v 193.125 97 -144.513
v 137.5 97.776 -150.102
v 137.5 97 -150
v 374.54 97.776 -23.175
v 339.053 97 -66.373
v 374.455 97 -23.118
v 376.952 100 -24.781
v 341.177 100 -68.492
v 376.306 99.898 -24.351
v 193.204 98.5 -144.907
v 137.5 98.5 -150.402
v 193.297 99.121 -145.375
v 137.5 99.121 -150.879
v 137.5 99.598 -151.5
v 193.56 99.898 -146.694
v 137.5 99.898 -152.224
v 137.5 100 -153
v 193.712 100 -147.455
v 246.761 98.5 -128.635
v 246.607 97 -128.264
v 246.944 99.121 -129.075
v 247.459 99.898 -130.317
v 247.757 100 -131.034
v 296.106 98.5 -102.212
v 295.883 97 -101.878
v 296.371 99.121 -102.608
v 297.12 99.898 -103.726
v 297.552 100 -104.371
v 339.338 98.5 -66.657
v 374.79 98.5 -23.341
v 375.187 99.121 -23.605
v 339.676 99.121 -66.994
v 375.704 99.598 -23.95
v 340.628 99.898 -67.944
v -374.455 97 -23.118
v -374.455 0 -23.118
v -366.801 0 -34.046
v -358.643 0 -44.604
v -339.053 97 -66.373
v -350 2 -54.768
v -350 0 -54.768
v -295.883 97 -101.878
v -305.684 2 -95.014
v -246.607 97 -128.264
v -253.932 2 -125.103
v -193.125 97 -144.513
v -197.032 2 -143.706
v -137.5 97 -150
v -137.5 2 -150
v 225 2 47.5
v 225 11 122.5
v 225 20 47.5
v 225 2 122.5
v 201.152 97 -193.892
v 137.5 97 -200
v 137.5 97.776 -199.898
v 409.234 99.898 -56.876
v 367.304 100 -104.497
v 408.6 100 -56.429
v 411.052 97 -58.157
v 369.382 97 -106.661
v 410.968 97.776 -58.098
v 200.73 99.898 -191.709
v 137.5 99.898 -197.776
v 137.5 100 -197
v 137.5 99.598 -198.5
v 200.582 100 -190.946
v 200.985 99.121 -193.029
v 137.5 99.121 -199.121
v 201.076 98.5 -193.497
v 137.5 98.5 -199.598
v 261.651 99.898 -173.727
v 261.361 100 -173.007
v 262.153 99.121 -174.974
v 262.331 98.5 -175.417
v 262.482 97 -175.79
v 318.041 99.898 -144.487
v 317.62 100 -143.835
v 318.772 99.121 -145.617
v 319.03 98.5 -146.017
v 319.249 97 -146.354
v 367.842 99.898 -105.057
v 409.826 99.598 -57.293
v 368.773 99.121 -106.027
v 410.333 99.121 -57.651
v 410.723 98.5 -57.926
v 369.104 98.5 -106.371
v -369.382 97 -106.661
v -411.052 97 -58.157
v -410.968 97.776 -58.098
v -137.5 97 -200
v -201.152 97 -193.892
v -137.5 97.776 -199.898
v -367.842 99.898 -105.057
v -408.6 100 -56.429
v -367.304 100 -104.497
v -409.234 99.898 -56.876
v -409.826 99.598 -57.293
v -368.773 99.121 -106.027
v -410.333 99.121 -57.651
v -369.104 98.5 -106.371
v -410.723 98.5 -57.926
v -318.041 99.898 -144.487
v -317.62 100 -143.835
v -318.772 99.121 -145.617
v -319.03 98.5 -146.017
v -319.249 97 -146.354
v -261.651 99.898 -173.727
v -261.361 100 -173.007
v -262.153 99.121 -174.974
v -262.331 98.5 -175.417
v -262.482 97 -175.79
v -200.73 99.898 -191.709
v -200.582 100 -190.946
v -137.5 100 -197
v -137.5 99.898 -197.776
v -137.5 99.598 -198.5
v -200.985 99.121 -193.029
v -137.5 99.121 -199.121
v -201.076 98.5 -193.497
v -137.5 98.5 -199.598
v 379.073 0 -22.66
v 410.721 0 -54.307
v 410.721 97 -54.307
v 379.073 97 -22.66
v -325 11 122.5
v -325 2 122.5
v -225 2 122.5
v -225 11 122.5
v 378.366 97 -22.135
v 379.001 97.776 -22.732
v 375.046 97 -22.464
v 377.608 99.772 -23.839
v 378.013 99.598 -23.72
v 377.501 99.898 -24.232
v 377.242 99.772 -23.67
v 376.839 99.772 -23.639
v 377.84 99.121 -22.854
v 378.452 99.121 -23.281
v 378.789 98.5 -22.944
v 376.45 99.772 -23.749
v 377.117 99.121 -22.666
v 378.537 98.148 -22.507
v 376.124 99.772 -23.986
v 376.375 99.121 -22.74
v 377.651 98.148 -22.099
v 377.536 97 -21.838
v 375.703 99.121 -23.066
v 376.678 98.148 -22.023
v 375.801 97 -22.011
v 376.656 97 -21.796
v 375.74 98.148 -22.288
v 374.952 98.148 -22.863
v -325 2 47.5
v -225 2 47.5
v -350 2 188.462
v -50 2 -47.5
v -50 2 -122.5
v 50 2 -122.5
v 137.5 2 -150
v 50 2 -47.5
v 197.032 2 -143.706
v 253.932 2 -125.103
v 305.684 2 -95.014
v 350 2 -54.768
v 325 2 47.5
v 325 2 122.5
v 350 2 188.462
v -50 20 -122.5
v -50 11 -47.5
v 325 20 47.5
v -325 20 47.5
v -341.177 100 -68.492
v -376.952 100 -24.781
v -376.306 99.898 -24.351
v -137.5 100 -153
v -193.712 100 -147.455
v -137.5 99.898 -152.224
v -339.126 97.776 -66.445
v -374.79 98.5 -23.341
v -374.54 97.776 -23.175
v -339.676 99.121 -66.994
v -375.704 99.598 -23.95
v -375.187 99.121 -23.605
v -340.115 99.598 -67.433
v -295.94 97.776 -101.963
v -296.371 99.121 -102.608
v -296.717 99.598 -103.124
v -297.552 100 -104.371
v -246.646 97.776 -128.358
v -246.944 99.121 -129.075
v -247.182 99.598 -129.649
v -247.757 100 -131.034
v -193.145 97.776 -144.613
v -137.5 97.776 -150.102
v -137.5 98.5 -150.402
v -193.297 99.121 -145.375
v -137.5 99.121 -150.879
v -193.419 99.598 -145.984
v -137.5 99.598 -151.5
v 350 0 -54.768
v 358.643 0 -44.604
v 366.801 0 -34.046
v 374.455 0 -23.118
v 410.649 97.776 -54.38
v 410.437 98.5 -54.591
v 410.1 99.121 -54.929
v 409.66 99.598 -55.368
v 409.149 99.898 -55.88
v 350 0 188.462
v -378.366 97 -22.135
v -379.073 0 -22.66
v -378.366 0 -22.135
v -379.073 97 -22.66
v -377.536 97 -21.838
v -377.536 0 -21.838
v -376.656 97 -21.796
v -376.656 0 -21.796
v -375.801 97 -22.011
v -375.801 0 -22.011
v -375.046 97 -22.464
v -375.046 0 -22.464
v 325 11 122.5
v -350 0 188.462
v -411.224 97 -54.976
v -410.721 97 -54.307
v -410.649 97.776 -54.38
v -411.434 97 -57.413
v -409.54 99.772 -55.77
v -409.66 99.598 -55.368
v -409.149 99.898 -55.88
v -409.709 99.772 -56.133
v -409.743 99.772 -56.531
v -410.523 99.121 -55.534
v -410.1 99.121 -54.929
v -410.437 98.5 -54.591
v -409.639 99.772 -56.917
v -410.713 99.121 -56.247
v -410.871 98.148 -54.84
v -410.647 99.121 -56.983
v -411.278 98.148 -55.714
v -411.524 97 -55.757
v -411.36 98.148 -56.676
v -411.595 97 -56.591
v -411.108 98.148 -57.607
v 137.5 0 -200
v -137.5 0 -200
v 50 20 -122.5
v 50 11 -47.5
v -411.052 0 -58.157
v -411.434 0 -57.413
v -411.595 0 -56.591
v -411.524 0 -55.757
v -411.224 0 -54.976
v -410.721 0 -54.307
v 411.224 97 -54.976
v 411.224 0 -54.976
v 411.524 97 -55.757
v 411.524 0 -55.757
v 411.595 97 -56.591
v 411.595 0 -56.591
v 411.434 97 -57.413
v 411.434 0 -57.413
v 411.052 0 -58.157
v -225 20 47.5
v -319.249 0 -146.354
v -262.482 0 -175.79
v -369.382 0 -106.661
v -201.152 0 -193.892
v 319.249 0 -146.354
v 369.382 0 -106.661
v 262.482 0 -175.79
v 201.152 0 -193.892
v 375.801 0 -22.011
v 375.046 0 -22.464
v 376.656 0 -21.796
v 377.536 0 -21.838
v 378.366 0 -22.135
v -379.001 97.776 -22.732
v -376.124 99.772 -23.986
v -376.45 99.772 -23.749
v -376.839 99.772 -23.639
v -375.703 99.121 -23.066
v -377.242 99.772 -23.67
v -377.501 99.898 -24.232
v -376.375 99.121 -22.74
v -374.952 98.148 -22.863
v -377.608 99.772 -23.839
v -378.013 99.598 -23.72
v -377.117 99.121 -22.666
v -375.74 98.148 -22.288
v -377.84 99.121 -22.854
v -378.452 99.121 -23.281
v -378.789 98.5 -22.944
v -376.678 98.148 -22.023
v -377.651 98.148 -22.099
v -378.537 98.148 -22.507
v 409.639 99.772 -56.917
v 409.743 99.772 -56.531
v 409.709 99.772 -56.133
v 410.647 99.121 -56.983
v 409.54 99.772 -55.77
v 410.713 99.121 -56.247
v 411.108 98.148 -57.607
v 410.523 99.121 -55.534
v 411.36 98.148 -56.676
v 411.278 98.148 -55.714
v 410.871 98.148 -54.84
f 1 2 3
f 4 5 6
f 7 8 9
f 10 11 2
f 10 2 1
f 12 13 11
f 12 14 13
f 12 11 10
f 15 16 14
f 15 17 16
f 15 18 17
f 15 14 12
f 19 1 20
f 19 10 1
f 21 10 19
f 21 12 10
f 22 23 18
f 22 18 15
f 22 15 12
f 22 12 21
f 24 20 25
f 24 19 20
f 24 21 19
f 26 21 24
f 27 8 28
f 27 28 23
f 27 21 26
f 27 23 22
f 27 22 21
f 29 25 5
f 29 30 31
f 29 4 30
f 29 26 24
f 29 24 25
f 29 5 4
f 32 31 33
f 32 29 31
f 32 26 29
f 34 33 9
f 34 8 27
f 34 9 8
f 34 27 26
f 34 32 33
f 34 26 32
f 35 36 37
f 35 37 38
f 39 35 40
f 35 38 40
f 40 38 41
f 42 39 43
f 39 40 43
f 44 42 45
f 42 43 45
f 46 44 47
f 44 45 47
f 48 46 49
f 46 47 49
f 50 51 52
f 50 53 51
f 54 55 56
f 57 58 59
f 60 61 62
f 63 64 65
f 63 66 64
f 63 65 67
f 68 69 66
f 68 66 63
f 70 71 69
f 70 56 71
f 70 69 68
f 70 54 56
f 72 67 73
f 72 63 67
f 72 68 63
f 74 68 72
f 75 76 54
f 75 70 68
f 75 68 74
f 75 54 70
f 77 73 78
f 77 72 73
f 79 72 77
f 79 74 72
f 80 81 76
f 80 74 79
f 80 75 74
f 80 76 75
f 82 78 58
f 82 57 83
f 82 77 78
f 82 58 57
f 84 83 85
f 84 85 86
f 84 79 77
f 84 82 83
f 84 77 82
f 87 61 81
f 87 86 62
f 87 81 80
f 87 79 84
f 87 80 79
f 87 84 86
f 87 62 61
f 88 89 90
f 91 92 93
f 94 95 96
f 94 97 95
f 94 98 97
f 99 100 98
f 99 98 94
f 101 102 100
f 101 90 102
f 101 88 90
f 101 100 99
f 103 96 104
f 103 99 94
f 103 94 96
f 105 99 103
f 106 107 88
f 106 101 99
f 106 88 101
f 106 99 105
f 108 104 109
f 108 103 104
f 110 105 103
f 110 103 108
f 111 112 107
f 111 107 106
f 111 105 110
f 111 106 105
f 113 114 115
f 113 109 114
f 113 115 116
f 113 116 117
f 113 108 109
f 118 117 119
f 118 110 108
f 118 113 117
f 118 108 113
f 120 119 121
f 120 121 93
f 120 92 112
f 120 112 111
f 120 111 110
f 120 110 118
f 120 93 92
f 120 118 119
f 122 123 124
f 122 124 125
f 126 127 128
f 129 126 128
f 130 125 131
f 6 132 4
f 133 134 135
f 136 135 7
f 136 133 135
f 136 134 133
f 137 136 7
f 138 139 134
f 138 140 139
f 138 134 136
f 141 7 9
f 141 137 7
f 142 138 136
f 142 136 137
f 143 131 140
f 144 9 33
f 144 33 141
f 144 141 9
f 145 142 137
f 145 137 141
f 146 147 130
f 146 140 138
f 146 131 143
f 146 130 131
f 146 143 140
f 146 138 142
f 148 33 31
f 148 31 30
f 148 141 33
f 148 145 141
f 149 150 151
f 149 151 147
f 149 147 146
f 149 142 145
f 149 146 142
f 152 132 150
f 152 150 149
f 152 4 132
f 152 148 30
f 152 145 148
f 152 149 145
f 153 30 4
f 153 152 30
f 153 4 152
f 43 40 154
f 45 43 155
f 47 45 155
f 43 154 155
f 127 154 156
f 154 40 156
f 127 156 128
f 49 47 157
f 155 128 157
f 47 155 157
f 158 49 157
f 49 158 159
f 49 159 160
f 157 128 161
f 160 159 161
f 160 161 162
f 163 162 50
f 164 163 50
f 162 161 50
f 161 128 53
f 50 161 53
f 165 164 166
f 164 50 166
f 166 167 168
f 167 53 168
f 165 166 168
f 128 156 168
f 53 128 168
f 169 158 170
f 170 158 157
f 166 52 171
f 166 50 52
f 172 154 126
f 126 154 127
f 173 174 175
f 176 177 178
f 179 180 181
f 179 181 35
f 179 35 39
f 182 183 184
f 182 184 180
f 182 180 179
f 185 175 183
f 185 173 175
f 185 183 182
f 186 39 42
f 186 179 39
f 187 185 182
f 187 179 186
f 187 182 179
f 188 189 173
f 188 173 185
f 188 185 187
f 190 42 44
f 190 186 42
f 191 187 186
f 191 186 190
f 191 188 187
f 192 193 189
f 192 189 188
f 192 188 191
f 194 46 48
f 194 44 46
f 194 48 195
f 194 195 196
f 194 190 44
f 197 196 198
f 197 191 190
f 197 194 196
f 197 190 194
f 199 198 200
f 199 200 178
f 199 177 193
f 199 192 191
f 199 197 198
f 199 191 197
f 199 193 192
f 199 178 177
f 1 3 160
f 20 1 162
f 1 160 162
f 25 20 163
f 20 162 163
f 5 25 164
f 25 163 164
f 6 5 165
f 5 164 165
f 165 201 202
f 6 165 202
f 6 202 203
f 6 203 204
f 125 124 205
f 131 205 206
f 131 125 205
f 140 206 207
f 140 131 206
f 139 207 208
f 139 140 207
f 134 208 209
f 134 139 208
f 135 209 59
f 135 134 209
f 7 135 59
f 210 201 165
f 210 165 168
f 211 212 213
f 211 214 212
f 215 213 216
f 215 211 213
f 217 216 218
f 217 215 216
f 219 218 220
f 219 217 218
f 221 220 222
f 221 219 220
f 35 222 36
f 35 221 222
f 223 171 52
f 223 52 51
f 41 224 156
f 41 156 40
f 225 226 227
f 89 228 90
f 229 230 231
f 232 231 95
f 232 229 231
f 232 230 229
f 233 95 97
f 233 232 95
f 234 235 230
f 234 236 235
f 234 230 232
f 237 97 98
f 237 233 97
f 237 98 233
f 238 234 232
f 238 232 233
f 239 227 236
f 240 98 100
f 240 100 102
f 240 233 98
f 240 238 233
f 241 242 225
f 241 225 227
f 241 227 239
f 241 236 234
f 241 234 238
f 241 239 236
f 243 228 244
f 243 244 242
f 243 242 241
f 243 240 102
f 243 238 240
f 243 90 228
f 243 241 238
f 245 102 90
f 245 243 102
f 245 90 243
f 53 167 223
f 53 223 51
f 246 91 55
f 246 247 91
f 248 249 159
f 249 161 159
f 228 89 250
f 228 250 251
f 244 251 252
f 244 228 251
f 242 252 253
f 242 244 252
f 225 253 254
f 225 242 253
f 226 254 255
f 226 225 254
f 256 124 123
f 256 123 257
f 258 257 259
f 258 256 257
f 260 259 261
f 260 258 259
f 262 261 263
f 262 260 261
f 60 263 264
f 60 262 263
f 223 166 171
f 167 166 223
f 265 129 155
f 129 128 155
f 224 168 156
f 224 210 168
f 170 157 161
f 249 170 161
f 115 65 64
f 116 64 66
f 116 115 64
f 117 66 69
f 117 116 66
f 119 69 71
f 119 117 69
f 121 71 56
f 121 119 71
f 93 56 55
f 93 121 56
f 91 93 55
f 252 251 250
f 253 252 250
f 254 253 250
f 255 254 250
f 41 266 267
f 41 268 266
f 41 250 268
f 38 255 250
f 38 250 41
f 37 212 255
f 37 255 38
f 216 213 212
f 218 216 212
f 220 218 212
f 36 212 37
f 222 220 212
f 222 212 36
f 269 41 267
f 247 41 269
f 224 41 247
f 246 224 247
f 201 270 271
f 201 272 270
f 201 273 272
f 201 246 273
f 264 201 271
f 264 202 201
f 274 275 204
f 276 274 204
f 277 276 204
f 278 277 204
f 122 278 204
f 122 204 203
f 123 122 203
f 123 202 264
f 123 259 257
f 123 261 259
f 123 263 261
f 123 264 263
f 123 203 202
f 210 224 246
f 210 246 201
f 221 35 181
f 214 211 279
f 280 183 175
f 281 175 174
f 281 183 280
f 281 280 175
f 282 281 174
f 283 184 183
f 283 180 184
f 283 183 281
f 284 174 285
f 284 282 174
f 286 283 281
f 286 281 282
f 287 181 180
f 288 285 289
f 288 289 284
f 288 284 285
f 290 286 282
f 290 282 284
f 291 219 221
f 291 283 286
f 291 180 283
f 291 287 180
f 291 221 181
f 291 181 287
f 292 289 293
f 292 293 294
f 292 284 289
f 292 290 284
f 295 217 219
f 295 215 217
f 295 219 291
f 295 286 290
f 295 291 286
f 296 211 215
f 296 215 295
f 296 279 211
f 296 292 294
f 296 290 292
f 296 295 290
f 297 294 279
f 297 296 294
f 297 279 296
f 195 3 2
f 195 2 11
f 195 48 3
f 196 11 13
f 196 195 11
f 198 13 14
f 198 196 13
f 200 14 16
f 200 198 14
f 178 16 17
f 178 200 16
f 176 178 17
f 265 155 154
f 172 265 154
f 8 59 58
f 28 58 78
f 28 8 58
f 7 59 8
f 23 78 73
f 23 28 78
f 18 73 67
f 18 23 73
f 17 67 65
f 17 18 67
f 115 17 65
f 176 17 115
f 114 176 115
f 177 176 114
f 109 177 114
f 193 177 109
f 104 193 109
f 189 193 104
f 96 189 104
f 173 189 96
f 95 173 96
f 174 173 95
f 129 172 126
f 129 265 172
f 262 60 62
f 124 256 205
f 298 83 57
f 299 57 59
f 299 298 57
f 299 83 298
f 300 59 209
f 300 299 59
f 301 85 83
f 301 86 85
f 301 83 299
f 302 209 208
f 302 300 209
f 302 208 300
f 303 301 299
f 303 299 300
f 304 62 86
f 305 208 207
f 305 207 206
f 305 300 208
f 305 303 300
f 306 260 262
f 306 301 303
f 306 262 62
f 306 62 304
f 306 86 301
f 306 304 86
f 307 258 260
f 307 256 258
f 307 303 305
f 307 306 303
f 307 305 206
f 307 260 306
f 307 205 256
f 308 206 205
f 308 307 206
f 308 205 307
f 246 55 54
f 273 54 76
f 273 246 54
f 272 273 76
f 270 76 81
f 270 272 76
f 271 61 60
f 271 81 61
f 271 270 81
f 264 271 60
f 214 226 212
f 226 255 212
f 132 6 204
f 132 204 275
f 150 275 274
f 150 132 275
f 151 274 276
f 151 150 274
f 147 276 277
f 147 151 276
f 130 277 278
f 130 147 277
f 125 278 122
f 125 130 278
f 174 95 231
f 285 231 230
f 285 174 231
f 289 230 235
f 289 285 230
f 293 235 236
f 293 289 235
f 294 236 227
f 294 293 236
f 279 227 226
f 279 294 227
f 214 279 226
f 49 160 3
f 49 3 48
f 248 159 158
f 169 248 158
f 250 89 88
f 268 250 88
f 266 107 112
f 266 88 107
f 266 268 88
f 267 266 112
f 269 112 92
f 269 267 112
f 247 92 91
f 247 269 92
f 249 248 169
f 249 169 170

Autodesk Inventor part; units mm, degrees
ref_plane "YZ Plane" through (0, 0, 0) normal (1, 0, 0) x (0, 1, 0)
ref_plane "XZ Plane" through (0, 0, 0) normal (0, 1, 0) x (-1, 0, 0)
ref_plane "XY Plane" through (0, 0, 0) normal (0, 0, 1) x (1, 0, 0)
sketch "Sketch1" plane through (0, 0, 0) normal (0, 1, 0) x (-1, 0, 0)
  line L0 (-50, -122.5) -> (50, -122.5)
  line L1 (50, -122.5) -> (50, -47.5)
  line L2 (50, -47.5) -> (-50, -47.5)
  line L3 (-50, -47.5) -> (-50, -122.5)
  line L4 (-50, -122.5) -> (50, -47.5) construction
  line L5 (50, -122.5) -> (-50, -47.5) construction
  line L6 (-325, 122.5) -> (-225, 122.5)
  line L7 (-225, 122.5) -> (-225, 47.5)
  line L8 (-225, 47.5) -> (-325, 47.5)
  line L9 (-325, 47.5) -> (-325, 122.5)
  line L10 (-325, 122.5) -> (-225, 47.5) construction
  line L11 (-225, 122.5) -> (-325, 47.5) construction
  line L12 (0, 214.4175) -> (0, -235.835)
  line L13 (325, 122.5) -> (225, 122.5)
  line L14 (225, 122.5) -> (225, 47.5)
  line L15 (225, 47.5) -> (325, 47.5)
  line L16 (325, 47.5) -> (325, 122.5)
  line L17 (325, 122.5) -> (225, 47.5) construction
  line L18 (225, 122.5) -> (325, 47.5) construction
  point P0 (0, 0)
  point P1 (0, -85)
  point P2 (-275, 85)
  point P3 (275, 85)
  dimension "d0" = 100
  dimension "d1" = 75
  dimension "d2" = 85
  dimension "d3" = 100
  dimension "d4" = 75
  dimension "d5" = 275
  dimension "d6" = 85
sketch "Sketch2" plane through (0, 0, 0) normal (0, 1, 0) x (-1, 0, 0)
  line L0 (-7.5, -95) -> (7.5, -95) projected
  line L1 (7.5, -95) -> (7.5, -75) projected
  line L2 (7.5, -75) -> (-7.5, -75) projected
  line L3 (-7.5, -75) -> (-7.5, -95) projected
  line L4 (267.5, 95) -> (267.5, 75) projected
  line L5 (267.5, 75) -> (282.5, 75) projected
  line L6 (282.5, 75) -> (282.5, 95) projected
  line L7 (282.5, 95) -> (267.5, 95) projected
  line L8 (-267.5, 95) -> (-282.5, 95) projected
  line L9 (-282.5, 95) -> (-282.5, 75) projected
  line L10 (-282.5, 75) -> (-267.5, 75) projected
  line L11 (-267.5, 75) -> (-267.5, 95) projected
  line L12 (-137.5, -150) -> (137.5, -150)
  line L13 (137.5, -150) -> (137.5, -200)
  line L14 (137.5, -200) -> (-137.5, -200)
  line L15 (-137.5, -200) -> (-137.5, -150)
  line L16 (-137.5, -150) -> (137.5, -200) construction
  line L17 (137.5, -150) -> (-137.5, -200) construction
  arc A0 (-376.4677, -20.0539) -> (-137.5, -150) centre (-137.5, 134.7009) ccw
  line L18 (-137.5, -150) -> (-137.5, 134.7009) construction
  line L19 (-412.5, 61.0149) -> (-137.5, 134.7009) construction
  arc A1 (-412.5, -56.0862) -> (-137.5, -200) centre (-137.5, 134.7009) ccw
  line L20 (0, -269.3547) -> (0, -73.2831)
  arc A2 (137.5, -150) -> (376.4677, -20.0539) centre (137.5, 134.7009) ccw
  arc A3 (137.5, -200) -> (412.5, -56.0862) centre (137.5, 134.7009) ccw
  line L21 (412.5, -56.0862) -> (376.4677, -20.0539)
  line L22 (412.5, -56.0862) -> (463.4573, -56.0862) construction
  line L23 (-412.5, -56.0862) -> (-376.4677, -20.0539)
  point P0 (0, 0)
  point P1 (0, -175)
  point P2 (412.5, 61.0149)
  dimension "d9" = 275
  dimension "d10" = 50
  dimension "d11" = 100
  dimension "d12" = 75
  dimension "d17" = 135
extrude "Extrusion2" add sketch "Sketch2" along normal blind 100 contours L12 L13 L14 L20 | L20 L14 L15 L12 | L15 A1 L23 A0 | A2 L21 A3 L13
fillet "Fillet1" radius 3 12 edges at (0, 100, -150) (273.507, 100, -115.4125) (-273.507, 100, -115.4125) (-394.4839, 100, -38.07) (394.4839, 100, -38.07) (-376.4677, 50, -20.0539) (-412.5, 50, -56.0862) (376.4677, 50, -20.0539) (412.5, 50, -56.0862) (-292.6904, 100, -161.847) (292.6904, 100, -161.847) (0, 100, -200)
sketch "Sketch3" plane through (0, 0, 0) normal (0, -1, 0) x (1, 0, 0)
  line L0 (350, 188.4615) -> (-350, 188.4615)
  line L1 (-350, 188.4615) -> (-350, -54.7677)
  line L2 (350, -54.7677) -> (350, 188.4615)
  arc A0 (411.0516, -58.1571) -> (410.721, -54.3072) centre (408.5997, -56.4285) ccw projected
  line L3 (379.0735, -22.6597) -> (410.721, -54.3072) projected
  arc A1 (379.0735, -22.6597) -> (374.4553, -23.118) centre (376.9522, -24.781) ccw projected
  arc A2 (137.5, -150) -> (374.4553, -23.118) centre (137.5, 134.7009) ccw projected
  line L4 (-137.5, -150) -> (137.5, -150) projected
  arc A3 (-374.4553, -23.118) -> (-137.5, -150) centre (-137.5, 134.7009) ccw projected
  arc A4 (-374.4553, -23.118) -> (-379.0735, -22.6597) centre (-376.9522, -24.781) ccw projected
  line L5 (-410.721, -54.3072) -> (-379.0735, -22.6597) projected
  arc A5 (-410.721, -54.3072) -> (-411.0516, -58.1571) centre (-408.5997, -56.4285) ccw projected
  arc A6 (-411.0516, -58.1571) -> (-137.5, -200) centre (-137.5, 134.7009) ccw projected
  line L6 (137.5, -200) -> (-137.5, -200) projected
  arc A7 (137.5, -200) -> (411.0516, -58.1571) centre (137.5, 134.7009) ccw projected
  arc A8 (137.5, -200) -> (411.0516, -58.1571) centre (137.5, 134.7009) ccw projected
  line L7 (0, -256.7037) -> (0, -18.0297)
  point P0 (0, 0)
  dimension "d31" = 700
extrude "Extrusion3" add sketch "Sketch3" against normal blind 2 contours L2 A2 L4 A3 L1 L0
extrude "Extrusion6" add sketch "Sketch1" along normal blind 20
sketch "Sketch6" plane through (325, 2, 47.5) normal (1, 0, 0) x (0, 0, -1)
  line L0 (0, 0) -> (-75, 0) projected
  line L1 (0, 0) -> (0, 18) projected
  line L2 (-75, 18) -> (0, 18) projected
  line L3 (-75, 0) -> (-75, 18) projected
  line L4 (0, 0) -> (0, 18) projected
  line L5 (0, 18) -> (-75, 9)
  line L6 (-75, 0) -> (-75, 18) projected
  line L7 (-75, 18) -> (0, 18)
  line L8 (-75, 9) -> (-75, 18)
  point P0 (47.5, -2)
extrude "Extrusion7" cut sketch "Sketch6" against normal through all contours L5 L3 L2
sketch "Sketch7" plane through (50, 2, -122.5) normal (1, 0, 0) x (0, 0, -1)
  line L0 (0, 0) -> (-75, 0) projected
  line L1 (0, 0) -> (0, 18) projected
  line L2 (-75, 18) -> (0, 18) projected
  line L3 (-75, 0) -> (-75, 18) projected
  line L4 (0, 18) -> (-75, 9)
  line L5 (-75, 9) -> (-75, 18)
  line L6 (-75, 18) -> (0, 18) projected
  line L7 (-75, 18) -> (0, 18)
  point P0 (-122.5, -2)
extrude "Extrusion8" cut sketch "Sketch7" against normal up to surface (100 mm away) contours L4 L3 L2
properties part number "Charging Dock" material "ABS Plastic"
